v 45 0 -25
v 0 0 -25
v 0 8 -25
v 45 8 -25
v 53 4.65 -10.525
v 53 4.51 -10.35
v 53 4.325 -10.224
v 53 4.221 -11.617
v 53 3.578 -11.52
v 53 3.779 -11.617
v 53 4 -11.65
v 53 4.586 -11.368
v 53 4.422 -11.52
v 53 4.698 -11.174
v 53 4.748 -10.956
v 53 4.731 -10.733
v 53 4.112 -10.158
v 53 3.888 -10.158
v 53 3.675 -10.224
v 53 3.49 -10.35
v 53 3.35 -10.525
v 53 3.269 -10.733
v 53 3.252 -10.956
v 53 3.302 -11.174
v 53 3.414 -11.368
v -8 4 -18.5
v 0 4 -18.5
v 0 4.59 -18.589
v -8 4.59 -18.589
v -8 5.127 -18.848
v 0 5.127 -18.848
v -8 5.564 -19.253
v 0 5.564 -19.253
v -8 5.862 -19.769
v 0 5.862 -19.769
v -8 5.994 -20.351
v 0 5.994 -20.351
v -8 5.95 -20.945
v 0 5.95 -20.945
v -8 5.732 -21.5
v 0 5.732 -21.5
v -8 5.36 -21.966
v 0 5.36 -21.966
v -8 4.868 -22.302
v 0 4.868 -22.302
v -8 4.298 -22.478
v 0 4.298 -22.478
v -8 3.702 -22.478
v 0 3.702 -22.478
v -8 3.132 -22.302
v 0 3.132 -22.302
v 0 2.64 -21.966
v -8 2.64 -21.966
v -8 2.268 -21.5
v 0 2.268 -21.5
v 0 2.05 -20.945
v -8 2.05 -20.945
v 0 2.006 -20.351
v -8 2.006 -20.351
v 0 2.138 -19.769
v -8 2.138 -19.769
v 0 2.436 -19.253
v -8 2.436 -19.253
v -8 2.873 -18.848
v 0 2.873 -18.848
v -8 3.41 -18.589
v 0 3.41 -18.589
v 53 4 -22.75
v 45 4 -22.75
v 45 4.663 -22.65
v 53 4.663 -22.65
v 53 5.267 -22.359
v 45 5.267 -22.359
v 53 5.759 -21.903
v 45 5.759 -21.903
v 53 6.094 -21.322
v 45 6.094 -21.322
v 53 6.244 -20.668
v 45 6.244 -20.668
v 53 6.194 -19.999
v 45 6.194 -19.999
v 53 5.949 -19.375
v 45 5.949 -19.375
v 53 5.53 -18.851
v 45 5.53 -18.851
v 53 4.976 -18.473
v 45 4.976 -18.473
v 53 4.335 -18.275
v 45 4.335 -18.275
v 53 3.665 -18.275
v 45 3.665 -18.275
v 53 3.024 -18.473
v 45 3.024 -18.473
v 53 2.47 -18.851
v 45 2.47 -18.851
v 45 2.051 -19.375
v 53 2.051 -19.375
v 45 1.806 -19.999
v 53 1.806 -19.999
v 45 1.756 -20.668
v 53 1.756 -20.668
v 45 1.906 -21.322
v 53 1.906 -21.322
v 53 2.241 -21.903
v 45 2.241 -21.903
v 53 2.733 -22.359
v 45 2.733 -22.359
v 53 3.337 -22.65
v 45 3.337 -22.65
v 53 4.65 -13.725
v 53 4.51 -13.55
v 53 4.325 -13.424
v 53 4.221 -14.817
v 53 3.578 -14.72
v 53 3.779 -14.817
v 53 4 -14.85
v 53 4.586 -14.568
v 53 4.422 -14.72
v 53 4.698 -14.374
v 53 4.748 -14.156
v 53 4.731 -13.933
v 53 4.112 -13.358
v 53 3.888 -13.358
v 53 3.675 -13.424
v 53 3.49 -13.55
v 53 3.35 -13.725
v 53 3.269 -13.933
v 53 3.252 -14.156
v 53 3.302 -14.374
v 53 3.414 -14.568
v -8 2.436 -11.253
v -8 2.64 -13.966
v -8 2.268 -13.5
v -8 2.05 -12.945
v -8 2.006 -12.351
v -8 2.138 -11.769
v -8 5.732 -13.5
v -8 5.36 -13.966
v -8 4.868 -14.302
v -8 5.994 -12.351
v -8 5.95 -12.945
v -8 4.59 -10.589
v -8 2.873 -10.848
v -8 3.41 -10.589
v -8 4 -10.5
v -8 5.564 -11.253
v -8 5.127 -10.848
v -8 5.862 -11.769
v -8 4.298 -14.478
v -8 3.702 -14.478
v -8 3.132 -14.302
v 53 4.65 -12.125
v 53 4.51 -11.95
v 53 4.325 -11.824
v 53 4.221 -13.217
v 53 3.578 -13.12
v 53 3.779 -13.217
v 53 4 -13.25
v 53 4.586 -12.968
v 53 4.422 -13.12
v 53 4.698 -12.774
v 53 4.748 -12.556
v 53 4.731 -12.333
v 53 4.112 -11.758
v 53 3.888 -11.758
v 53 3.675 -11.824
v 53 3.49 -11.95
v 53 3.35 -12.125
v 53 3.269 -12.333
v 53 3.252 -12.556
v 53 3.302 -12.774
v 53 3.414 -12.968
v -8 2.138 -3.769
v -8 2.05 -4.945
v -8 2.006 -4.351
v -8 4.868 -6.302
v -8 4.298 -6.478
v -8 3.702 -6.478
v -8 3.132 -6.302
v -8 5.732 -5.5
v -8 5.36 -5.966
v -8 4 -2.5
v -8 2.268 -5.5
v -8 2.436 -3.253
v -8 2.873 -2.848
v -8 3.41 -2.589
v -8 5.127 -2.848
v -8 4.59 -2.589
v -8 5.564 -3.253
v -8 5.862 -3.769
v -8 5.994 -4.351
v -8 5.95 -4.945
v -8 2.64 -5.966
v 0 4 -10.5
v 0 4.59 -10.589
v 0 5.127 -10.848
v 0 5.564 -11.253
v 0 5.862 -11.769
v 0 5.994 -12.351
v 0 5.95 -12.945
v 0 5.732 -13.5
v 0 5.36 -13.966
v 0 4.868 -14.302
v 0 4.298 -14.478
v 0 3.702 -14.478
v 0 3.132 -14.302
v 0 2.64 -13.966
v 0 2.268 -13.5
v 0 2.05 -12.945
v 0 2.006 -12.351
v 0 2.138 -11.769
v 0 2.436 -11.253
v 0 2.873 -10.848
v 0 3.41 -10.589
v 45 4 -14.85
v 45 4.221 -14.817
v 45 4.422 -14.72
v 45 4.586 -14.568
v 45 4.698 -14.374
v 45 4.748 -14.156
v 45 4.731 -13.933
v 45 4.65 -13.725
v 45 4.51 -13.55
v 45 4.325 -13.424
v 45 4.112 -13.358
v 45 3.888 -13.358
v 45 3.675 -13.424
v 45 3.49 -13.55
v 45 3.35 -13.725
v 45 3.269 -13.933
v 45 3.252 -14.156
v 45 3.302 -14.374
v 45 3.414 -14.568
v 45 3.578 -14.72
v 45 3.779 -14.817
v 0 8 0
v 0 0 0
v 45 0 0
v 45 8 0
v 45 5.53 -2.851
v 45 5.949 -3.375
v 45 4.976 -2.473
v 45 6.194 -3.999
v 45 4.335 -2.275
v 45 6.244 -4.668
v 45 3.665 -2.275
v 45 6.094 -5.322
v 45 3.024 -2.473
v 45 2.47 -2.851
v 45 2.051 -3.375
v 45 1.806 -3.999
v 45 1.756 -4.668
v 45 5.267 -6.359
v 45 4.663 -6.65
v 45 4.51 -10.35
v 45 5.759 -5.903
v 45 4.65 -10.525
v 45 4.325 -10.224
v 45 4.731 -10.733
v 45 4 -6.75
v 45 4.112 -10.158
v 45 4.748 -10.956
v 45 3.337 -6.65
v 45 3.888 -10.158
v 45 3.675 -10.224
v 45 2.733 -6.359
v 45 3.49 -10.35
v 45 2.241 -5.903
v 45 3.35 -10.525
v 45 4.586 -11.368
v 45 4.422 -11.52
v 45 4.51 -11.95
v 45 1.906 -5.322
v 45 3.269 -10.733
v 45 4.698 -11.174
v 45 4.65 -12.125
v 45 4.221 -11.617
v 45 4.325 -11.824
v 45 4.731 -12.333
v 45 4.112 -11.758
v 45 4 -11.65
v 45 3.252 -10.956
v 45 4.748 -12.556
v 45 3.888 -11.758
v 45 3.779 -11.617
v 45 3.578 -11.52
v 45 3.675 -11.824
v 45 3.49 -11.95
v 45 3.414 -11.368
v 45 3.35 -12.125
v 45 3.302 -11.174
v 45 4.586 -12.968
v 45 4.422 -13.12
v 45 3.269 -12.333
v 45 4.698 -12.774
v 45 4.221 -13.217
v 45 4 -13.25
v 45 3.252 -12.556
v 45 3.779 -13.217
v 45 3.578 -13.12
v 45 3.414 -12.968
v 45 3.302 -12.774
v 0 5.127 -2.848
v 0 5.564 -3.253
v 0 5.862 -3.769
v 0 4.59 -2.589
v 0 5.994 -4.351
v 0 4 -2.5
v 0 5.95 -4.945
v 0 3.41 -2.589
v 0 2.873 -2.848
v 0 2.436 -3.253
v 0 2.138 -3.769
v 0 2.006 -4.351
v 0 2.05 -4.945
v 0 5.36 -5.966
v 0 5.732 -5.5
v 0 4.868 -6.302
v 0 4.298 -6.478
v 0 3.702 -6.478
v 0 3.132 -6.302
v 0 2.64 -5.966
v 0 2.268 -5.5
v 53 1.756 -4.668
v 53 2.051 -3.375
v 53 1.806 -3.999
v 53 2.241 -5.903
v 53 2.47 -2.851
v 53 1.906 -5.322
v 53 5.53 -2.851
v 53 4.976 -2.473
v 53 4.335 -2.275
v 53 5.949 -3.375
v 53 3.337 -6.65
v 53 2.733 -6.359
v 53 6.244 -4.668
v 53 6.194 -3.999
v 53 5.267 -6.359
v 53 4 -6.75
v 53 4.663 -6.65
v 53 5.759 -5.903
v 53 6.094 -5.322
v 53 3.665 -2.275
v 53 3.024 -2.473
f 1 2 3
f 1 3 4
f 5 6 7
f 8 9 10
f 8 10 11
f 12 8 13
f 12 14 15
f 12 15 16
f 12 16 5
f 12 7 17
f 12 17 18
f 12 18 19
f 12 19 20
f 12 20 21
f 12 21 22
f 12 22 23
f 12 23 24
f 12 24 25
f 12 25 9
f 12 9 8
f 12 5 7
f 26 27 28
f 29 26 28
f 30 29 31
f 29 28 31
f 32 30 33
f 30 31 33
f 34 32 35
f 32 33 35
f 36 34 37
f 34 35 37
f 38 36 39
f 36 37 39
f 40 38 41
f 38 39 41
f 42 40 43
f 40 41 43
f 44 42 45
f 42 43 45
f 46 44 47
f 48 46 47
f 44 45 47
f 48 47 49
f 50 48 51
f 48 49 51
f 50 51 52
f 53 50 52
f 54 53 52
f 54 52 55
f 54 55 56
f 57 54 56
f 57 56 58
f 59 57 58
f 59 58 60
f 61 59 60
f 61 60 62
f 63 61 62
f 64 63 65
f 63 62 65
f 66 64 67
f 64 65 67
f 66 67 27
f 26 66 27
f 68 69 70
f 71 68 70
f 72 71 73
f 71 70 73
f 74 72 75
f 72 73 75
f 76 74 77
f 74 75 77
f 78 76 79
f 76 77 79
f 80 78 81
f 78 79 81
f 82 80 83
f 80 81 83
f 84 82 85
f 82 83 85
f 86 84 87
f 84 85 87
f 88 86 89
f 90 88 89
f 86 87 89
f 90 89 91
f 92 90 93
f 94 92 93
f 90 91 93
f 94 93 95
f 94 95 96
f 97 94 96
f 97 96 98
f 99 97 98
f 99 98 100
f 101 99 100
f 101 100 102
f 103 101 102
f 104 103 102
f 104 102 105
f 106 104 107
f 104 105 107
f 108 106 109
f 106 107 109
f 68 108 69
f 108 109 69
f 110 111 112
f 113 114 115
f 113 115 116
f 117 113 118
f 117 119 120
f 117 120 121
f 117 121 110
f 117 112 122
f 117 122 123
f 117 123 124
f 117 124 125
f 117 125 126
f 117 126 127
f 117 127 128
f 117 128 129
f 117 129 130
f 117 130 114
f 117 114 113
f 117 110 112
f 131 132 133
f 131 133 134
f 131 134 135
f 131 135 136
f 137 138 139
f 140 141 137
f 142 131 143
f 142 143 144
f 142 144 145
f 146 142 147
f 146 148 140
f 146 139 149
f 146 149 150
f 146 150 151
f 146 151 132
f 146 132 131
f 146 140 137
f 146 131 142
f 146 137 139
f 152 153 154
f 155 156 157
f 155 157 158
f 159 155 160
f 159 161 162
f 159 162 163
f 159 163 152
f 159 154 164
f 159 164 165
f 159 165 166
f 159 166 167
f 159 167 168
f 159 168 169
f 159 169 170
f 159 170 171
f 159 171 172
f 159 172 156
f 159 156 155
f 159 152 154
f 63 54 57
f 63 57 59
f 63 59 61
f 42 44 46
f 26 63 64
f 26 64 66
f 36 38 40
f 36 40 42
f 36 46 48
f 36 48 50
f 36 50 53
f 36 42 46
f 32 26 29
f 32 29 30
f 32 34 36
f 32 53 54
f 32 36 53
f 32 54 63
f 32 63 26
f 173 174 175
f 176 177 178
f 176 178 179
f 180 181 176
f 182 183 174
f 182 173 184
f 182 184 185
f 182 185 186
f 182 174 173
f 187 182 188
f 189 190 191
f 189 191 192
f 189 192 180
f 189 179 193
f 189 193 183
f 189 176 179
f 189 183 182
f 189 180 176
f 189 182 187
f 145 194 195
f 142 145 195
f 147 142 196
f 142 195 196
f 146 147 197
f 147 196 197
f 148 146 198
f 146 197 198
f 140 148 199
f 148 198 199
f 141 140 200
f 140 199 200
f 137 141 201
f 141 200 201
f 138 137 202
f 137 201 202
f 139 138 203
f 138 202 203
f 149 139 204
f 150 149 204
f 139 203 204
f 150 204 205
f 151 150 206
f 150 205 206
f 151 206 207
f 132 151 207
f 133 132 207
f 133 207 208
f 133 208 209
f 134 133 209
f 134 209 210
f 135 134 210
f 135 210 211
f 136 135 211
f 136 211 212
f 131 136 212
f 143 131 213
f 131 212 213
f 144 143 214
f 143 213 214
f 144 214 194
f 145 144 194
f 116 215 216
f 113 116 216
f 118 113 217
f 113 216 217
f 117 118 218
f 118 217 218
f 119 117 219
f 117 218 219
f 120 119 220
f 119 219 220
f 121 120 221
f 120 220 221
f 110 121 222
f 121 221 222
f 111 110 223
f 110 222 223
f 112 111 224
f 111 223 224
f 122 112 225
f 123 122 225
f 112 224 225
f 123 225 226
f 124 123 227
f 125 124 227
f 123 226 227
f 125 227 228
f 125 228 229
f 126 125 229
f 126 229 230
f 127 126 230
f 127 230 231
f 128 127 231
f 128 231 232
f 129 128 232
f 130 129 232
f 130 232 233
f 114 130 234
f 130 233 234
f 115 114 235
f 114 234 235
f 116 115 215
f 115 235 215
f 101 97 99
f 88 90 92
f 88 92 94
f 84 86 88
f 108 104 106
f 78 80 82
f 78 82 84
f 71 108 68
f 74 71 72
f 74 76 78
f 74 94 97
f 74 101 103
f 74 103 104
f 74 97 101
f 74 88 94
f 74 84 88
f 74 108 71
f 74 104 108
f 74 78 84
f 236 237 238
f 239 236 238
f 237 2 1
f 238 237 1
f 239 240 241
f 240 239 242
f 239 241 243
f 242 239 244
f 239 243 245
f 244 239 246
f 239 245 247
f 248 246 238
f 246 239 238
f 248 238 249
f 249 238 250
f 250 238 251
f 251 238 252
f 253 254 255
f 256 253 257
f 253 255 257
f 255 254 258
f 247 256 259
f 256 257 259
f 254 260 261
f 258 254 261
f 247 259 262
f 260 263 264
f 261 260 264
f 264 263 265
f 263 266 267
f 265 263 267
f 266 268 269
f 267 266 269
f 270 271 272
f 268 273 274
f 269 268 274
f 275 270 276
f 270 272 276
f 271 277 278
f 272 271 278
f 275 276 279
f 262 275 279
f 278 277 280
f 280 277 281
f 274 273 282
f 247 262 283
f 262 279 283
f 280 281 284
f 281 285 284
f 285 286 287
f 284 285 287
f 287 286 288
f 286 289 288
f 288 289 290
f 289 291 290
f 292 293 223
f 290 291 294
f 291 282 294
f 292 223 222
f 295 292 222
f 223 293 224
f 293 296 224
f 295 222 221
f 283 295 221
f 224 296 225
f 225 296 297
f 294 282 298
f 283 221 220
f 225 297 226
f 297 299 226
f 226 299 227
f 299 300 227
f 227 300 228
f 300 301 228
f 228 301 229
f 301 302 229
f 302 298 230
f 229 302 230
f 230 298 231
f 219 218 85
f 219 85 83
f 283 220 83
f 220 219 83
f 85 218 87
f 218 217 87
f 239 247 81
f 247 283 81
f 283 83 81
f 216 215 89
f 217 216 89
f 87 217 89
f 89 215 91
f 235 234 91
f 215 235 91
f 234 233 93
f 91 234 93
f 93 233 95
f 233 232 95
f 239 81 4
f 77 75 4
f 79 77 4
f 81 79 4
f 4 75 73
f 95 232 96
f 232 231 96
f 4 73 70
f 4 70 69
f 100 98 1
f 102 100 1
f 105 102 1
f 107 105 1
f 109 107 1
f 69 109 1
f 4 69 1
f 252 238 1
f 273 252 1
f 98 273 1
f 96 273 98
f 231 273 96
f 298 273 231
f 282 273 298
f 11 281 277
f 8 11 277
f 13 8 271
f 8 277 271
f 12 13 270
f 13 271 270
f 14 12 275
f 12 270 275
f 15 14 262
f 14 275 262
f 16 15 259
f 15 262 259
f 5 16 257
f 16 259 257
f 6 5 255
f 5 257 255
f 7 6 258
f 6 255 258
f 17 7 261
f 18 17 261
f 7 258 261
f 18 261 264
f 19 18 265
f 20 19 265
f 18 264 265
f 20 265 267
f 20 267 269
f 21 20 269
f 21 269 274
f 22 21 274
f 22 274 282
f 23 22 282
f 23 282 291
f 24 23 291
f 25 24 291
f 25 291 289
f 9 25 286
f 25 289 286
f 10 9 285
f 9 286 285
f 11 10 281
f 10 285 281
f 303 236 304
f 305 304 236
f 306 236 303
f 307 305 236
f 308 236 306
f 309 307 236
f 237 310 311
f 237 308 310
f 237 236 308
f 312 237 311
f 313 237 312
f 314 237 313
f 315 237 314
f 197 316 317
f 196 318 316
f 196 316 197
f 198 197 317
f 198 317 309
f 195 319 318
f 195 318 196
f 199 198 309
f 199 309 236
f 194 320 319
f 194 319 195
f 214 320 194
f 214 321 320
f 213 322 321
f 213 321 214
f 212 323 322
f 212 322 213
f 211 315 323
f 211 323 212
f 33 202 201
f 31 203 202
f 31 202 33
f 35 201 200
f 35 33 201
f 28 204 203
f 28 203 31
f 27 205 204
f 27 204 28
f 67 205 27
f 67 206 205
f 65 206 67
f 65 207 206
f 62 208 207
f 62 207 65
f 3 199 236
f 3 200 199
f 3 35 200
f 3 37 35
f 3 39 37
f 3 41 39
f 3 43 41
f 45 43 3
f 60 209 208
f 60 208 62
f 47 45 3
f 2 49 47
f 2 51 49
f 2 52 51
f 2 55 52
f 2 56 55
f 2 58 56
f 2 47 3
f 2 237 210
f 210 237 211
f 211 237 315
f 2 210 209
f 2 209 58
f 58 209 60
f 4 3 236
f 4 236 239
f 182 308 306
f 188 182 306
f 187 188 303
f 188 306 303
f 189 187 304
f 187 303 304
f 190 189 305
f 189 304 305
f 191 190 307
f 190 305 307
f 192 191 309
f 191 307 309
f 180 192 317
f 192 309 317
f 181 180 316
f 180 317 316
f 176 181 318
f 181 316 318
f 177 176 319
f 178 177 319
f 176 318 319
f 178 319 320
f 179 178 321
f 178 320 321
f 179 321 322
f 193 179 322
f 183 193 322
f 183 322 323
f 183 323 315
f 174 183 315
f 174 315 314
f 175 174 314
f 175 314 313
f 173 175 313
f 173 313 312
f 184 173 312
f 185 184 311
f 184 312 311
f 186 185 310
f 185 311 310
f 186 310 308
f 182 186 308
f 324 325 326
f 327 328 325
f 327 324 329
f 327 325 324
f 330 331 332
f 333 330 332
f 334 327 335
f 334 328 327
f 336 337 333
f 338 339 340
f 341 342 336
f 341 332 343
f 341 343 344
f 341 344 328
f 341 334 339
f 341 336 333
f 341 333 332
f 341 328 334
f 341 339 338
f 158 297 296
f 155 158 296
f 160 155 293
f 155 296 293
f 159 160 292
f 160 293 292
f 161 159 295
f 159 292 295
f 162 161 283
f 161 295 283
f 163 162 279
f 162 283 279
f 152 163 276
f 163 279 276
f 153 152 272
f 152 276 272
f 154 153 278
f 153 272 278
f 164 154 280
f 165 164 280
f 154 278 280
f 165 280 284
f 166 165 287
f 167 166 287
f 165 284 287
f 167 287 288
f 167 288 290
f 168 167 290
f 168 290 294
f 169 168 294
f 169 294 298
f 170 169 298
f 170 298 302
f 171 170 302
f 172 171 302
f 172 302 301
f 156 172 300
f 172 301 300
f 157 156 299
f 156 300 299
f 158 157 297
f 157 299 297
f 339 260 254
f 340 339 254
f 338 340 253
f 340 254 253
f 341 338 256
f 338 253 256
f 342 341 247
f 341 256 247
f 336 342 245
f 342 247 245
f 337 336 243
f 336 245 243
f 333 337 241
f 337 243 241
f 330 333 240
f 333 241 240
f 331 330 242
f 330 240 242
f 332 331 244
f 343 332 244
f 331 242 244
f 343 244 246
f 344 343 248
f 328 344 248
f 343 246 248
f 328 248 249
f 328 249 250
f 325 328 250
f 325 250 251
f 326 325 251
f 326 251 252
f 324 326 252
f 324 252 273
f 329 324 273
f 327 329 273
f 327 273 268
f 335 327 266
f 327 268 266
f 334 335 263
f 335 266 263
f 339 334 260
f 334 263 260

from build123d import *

# Parameters (mm, degrees)
SKETCH1_W           = 45
SKETCH1_H           = 25
BOSS_EXTRUDE1_DEPTH = 8
SKETCH2_R           = 2
BOSS_EXTRUDE2_DEPTH = 8
SKETCH3_R           = 2.25
SKETCH3_R_2         = 0.75
BOSS_EXTRUDE5_DEPTH = 8


with BuildPart() as part:
    # Sketch1 → Boss-Extrude1 (new body)
    with BuildSketch(Plane(origin=(0, 0, 0), x_dir=(1, 0, 0), z_dir=(0, 1, 0))):
        with Locations((22.5, 12.5)):
            Rectangle(SKETCH1_W, SKETCH1_H)
    extrude(amount=BOSS_EXTRUDE1_DEPTH)

    # Sketch2 → Boss-Extrude2 (add)
    with BuildSketch(Plane.ZY):
        with Locations((-12.5, 4)):
            Circle(SKETCH2_R)
        with Locations((-20.5, 4)):
            Circle(SKETCH2_R)
        with Locations((-4.5, 4)):
            Circle(SKETCH2_R)
    extrude(amount=BOSS_EXTRUDE2_DEPTH)

    # Sketch3 → Boss-Extrude5 (add)
    with BuildSketch(Plane(origin=(45, 0, 0), x_dir=(0, 0, -1), z_dir=(1, 0, 0))):
        with Locations((4.5, 4)):
            Circle(SKETCH3_R)
        with Locations((20.5, 4)):
            Circle(SKETCH3_R)
        with Locations((10.9, 4)):
            Circle(SKETCH3_R_2)
        with Locations((12.5, 4)):
            Circle(SKETCH3_R_2)
        with Locations((14.1, 4)):
            Circle(SKETCH3_R_2)
    extrude(amount=BOSS_EXTRUDE5_DEPTH)


solid = part.part
